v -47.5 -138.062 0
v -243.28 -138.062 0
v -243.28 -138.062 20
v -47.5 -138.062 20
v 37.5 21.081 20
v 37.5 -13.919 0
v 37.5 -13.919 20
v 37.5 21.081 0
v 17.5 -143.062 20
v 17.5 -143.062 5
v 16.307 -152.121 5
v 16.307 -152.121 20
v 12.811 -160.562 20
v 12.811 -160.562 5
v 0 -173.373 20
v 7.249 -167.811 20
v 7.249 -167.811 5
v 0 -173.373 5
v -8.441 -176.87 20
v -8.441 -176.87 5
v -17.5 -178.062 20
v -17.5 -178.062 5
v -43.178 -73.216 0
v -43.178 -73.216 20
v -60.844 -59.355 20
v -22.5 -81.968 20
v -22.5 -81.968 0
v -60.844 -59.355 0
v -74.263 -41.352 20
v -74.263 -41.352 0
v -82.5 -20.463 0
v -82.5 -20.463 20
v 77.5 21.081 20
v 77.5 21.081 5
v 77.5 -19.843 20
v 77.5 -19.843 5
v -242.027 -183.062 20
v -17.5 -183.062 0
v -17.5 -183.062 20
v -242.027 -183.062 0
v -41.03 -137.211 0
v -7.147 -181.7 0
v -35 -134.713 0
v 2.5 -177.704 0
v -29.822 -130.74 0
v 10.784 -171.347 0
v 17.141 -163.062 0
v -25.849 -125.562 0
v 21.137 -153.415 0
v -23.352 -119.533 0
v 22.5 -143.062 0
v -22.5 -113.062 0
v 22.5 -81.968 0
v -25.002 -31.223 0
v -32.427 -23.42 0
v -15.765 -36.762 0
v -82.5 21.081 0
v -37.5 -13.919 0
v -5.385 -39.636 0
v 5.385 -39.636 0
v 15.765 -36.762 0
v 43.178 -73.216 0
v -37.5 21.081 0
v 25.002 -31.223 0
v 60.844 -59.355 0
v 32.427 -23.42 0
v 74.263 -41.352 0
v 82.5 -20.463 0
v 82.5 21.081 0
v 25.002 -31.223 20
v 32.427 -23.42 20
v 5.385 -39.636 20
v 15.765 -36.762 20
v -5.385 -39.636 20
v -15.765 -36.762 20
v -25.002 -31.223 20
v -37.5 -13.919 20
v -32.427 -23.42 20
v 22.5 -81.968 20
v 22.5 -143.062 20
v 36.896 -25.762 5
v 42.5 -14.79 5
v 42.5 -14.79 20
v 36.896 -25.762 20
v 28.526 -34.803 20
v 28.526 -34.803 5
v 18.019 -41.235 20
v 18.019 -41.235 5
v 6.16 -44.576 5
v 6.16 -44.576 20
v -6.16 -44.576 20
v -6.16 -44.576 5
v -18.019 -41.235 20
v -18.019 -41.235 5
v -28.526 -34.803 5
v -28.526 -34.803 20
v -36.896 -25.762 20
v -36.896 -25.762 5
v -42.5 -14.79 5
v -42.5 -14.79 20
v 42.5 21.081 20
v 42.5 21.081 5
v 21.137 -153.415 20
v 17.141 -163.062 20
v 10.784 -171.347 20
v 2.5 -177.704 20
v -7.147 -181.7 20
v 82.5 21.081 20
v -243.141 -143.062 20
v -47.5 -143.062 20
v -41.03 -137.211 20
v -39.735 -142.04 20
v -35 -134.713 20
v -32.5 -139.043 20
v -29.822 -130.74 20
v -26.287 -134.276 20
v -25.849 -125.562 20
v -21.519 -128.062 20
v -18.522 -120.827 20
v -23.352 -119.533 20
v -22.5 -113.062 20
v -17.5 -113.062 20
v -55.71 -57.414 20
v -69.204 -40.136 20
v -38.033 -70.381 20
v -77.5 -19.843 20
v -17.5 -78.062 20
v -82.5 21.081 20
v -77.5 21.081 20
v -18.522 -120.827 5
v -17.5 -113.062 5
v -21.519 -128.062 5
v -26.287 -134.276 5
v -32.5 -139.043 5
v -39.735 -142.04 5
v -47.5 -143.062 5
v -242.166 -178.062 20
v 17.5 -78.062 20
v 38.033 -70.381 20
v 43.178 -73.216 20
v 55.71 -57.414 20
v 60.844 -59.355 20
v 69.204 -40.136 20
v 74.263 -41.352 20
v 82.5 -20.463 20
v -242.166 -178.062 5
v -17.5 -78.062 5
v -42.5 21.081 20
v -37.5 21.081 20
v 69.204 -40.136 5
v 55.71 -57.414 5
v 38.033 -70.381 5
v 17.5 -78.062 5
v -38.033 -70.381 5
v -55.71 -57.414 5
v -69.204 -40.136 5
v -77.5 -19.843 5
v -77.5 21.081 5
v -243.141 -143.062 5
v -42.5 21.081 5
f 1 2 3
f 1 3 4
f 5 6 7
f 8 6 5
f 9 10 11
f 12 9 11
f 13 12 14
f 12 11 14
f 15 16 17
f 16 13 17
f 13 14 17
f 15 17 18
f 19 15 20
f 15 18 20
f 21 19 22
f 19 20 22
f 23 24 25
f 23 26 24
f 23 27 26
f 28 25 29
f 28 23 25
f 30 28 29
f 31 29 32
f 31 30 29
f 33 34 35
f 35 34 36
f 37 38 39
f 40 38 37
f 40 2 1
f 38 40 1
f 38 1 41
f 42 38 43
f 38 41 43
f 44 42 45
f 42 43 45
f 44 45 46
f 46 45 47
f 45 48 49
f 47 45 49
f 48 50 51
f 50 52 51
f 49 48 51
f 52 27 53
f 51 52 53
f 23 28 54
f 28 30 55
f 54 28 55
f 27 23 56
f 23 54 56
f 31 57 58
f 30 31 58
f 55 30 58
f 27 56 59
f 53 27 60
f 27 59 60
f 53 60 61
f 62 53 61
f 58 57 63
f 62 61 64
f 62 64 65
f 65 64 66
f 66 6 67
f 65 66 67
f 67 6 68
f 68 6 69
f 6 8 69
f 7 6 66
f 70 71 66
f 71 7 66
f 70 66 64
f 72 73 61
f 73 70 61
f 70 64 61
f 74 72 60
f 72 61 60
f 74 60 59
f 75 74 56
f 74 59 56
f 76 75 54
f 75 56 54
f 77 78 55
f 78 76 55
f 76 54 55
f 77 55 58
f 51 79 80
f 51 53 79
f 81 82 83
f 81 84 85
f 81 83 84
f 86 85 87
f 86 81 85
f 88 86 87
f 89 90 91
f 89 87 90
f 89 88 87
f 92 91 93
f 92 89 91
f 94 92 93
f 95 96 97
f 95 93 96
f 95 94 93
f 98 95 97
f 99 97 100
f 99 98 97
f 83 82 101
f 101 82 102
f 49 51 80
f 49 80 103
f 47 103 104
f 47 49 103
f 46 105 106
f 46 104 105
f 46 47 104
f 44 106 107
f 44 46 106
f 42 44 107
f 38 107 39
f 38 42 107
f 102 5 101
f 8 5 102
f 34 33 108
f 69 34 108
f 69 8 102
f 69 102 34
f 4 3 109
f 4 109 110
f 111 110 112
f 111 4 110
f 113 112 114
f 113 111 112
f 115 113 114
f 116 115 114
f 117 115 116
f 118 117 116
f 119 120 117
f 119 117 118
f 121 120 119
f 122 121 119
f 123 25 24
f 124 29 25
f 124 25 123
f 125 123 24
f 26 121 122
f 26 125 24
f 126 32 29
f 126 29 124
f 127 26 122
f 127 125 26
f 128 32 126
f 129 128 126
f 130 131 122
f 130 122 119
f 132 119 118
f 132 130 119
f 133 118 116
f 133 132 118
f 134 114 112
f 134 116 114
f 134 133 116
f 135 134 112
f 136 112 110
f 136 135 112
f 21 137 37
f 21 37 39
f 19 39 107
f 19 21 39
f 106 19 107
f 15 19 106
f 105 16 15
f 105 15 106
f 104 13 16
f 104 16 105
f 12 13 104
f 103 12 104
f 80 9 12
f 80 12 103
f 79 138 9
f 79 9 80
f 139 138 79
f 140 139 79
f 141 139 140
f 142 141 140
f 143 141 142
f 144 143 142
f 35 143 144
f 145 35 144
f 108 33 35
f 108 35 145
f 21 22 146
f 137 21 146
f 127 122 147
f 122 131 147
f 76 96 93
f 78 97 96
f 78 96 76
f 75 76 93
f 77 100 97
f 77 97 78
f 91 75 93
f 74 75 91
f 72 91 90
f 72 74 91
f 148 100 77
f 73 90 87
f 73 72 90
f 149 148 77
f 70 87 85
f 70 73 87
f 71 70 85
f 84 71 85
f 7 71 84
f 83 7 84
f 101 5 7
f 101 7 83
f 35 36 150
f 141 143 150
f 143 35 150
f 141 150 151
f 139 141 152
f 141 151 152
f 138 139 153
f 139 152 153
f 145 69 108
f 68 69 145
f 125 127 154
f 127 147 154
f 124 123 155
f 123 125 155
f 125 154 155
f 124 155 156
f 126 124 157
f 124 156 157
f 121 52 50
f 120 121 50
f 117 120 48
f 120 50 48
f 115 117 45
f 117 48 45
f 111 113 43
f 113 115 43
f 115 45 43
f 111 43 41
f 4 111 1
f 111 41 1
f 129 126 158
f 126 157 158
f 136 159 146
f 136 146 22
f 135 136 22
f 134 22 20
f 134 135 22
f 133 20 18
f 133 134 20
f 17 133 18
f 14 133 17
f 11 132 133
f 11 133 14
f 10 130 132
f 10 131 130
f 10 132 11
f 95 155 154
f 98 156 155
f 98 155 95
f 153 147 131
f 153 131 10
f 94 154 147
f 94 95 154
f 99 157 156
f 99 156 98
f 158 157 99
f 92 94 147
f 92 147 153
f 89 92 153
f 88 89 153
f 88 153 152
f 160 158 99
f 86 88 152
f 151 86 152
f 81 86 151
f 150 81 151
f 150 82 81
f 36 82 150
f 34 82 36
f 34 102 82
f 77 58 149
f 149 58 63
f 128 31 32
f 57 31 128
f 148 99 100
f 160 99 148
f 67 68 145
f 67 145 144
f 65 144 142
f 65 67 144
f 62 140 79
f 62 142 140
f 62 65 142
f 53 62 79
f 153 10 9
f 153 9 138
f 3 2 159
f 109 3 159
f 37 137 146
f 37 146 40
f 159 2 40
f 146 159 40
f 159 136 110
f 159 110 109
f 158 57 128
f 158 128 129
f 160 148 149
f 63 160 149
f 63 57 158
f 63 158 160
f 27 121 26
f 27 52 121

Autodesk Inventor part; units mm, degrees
ref_plane "YZ Plane" through (0, 0, 0) normal (1, 0, 0) x (0, 1, 0)
ref_plane "XZ Plane" through (0, 0, 0) normal (0, 1, 0) x (-1, 0, 0)
ref_plane "XY Plane" through (0, 0, 0) normal (0, 0, 1) x (1, 0, 0)
sketch "Sketch1" plane through (0, 0, 0) normal (0, 0, 1) x (1, 0, 0)
  arc A0 (-37.5, -13.9194) -> (37.5, -13.9194) centre (0, 0) ccw
  line L0 (-37.5, -13.9194) -> (-37.5, 21.0806)
  line L1 (37.5, -13.9194) -> (37.5, 21.0806)
  arc A1 (-42.5, -14.7902) -> (42.5, -14.7902) centre (0, 0) ccw
  line L2 (-42.5, -14.7902) -> (-42.5, 21.0806)
  line L3 (42.5, -14.7902) -> (42.5, 21.0806)
  line L4 (77.5, 21.0806) -> (77.5, -19.8431)
  line L5 (-77.5, -19.8431) -> (-77.5, 21.0806)
  line L6 (82.5, 21.0806) -> (82.5, -20.4634)
  line L7 (-82.5, -20.4634) -> (-82.5, 21.0806)
  line L8 (17.5, -113.0625) -> (17.5, -78.0625)
  line L9 (-17.5, -113.0625) -> (-17.5, -78.0625)
  line L10 (22.5, -81.968) -> (22.5, -108.0625)
  line L11 (-22.5, -108.0625) -> (-22.5, -81.968)
  line L12 (22.5, -108.0625) -> (17.5, -108.0625)
  arc A2 (-77.5, -19.8431) -> (-17.5, -78.0625) centre (0, 0) ccw
  arc A3 (17.5, -78.0625) -> (77.5, -19.8431) centre (0, 0) ccw
  arc A4 (-82.5, -20.4634) -> (-22.5, -81.968) centre (0, 0) ccw
  arc A5 (22.5, -81.968) -> (82.5, -20.4634) centre (0, 0) ccw
  line L13 (-17.5, -113.0625) -> (-17.5, -108.0625)
  line L14 (17.5, -113.0625) -> (17.5, -108.0625)
  line L15 (-82.5, 21.0806) -> (-77.5, 21.0806)
  line L16 (-42.5, 21.0806) -> (-37.5, 21.0806)
  line L17 (37.5, 21.0806) -> (42.5, 21.0806)
  line L18 (77.5, 21.0806) -> (82.5, 21.0806)
  line L19 (-22.5, -13.9194) -> (-17.5, -13.9194)
  line L20 (17.5, -13.9194) -> (22.5, -13.9194)
  line L21 (-77.5, 21.0806) -> (82.5, 21.0806)
  line L22 (1.8649, -108.0625) -> (17.5, -108.0625)
  line L23 (22.5, -108.0625) -> (22.5, -143.0625)
  line L24 (17.5, -143.0625) -> (17.5, -108.0625)
  line L25 (-17.5, -108.0625) -> (-17.5, -113.0625)
  line L26 (22.5, -178.0625) -> (22.5, -178.0625)
  line L27 (-17.5, -183.0625) -> (-287.4597, -183.0625)
  line L28 (-17.5, -178.0625) -> (-287.099, -178.0625)
  line L29 (-287.4597, -138.0625) -> (-47.5, -138.0625)
  line L30 (-22.5, -113.0625) -> (-22.5, -108.0625)
  line L31 (-287.4597, -183.0625) -> (-287.4597, -138.0625)
  line L32 (-17.5, -78.0625) -> (17.5, -78.0625)
  line L33 (-243.2803, -138.0625) -> (-242.0268, -183.0625)
  arc A6 (-17.5, -178.0625) -> (17.5, -143.0625) centre (-17.5, -143.0625) ccw
  arc A7 (-17.5, -183.0625) -> (22.5, -143.0625) centre (-17.5, -143.0625) ccw
  arc A8 (-47.5, -143.0625) -> (-17.5, -113.0625) centre (-47.5, -113.0625) ccw
  arc A9 (-47.5, -138.0625) -> (-22.5, -113.0625) centre (-47.5, -113.0625) ccw
  line L34 (-47.5, -143.0625) -> (-287.4597, -143.0625)
  line L35 (-22.5, -113.0625) -> (-22.5, -108.0625)
  point P0 (-42.5, 21.0806)
  point P1 (77.5, 21.0806)
  point P2 (42.5, 21.0806)
  point P3 (17.5, -162.4274)
  point P4 (-287.5, -178.0625)
  point P5 (37.5, 21.0806)
  point P6 (-243.1411, -143.0625)
  point P7 (-242.1661, -178.0625)
  dimension "d0" = 75
  dimension "d1" = 40
  dimension "d2" = 35
  dimension "d3" = 35
  dimension "d4" = 5
  dimension "d5" = 5
  dimension "d6" = 5
  dimension "d9" = 35
  dimension "d10" = 20
  dimension "d11" = 5
  dimension "d12" = 0
  dimension "d13" = 0
  dimension "d14" = 5
  dimension "d21" = 35
  dimension "d22" = 310
  dimension "d23" = 305
  dimension "d24" = 5
  dimension "d31" = 100
  dimension "d32" = 85
  dimension "d33" = 80
  dimension "d34" = 78.0625
  dimension "d37" = 5
extrude "Extrusion1" add sketch "Sketch1" along normal blind 20 contours A0 L1 L17 L3 A1 L2 L16 L0 | L5 A2 L9 A8 L34 L33 L29 A9 L30 L11 A4 L7 L15 | L18 L6 A5 L10 L12 L8 A3 L4 | L12 L23 A7 L27 L33 L28 A6 L24 L8
extrude "Extrusion2" add sketch "Sketch1" along normal blind 5 contours L2 A1 L3 L21 L4 A3 L32 A2 L5 | L18 L6 A5 L10 L12 L8 A3 L4 | L32 L8 L24 A6 L28 L33 L34 A8 L9
extrude "Extrusion3" cut sketch "Sketch1" along normal through all both and the other way through all contours L34 L31 L29 L33 | L33 L27 L31 L34
equation "\"d3\" = d2"
properties part number "storrageout"
